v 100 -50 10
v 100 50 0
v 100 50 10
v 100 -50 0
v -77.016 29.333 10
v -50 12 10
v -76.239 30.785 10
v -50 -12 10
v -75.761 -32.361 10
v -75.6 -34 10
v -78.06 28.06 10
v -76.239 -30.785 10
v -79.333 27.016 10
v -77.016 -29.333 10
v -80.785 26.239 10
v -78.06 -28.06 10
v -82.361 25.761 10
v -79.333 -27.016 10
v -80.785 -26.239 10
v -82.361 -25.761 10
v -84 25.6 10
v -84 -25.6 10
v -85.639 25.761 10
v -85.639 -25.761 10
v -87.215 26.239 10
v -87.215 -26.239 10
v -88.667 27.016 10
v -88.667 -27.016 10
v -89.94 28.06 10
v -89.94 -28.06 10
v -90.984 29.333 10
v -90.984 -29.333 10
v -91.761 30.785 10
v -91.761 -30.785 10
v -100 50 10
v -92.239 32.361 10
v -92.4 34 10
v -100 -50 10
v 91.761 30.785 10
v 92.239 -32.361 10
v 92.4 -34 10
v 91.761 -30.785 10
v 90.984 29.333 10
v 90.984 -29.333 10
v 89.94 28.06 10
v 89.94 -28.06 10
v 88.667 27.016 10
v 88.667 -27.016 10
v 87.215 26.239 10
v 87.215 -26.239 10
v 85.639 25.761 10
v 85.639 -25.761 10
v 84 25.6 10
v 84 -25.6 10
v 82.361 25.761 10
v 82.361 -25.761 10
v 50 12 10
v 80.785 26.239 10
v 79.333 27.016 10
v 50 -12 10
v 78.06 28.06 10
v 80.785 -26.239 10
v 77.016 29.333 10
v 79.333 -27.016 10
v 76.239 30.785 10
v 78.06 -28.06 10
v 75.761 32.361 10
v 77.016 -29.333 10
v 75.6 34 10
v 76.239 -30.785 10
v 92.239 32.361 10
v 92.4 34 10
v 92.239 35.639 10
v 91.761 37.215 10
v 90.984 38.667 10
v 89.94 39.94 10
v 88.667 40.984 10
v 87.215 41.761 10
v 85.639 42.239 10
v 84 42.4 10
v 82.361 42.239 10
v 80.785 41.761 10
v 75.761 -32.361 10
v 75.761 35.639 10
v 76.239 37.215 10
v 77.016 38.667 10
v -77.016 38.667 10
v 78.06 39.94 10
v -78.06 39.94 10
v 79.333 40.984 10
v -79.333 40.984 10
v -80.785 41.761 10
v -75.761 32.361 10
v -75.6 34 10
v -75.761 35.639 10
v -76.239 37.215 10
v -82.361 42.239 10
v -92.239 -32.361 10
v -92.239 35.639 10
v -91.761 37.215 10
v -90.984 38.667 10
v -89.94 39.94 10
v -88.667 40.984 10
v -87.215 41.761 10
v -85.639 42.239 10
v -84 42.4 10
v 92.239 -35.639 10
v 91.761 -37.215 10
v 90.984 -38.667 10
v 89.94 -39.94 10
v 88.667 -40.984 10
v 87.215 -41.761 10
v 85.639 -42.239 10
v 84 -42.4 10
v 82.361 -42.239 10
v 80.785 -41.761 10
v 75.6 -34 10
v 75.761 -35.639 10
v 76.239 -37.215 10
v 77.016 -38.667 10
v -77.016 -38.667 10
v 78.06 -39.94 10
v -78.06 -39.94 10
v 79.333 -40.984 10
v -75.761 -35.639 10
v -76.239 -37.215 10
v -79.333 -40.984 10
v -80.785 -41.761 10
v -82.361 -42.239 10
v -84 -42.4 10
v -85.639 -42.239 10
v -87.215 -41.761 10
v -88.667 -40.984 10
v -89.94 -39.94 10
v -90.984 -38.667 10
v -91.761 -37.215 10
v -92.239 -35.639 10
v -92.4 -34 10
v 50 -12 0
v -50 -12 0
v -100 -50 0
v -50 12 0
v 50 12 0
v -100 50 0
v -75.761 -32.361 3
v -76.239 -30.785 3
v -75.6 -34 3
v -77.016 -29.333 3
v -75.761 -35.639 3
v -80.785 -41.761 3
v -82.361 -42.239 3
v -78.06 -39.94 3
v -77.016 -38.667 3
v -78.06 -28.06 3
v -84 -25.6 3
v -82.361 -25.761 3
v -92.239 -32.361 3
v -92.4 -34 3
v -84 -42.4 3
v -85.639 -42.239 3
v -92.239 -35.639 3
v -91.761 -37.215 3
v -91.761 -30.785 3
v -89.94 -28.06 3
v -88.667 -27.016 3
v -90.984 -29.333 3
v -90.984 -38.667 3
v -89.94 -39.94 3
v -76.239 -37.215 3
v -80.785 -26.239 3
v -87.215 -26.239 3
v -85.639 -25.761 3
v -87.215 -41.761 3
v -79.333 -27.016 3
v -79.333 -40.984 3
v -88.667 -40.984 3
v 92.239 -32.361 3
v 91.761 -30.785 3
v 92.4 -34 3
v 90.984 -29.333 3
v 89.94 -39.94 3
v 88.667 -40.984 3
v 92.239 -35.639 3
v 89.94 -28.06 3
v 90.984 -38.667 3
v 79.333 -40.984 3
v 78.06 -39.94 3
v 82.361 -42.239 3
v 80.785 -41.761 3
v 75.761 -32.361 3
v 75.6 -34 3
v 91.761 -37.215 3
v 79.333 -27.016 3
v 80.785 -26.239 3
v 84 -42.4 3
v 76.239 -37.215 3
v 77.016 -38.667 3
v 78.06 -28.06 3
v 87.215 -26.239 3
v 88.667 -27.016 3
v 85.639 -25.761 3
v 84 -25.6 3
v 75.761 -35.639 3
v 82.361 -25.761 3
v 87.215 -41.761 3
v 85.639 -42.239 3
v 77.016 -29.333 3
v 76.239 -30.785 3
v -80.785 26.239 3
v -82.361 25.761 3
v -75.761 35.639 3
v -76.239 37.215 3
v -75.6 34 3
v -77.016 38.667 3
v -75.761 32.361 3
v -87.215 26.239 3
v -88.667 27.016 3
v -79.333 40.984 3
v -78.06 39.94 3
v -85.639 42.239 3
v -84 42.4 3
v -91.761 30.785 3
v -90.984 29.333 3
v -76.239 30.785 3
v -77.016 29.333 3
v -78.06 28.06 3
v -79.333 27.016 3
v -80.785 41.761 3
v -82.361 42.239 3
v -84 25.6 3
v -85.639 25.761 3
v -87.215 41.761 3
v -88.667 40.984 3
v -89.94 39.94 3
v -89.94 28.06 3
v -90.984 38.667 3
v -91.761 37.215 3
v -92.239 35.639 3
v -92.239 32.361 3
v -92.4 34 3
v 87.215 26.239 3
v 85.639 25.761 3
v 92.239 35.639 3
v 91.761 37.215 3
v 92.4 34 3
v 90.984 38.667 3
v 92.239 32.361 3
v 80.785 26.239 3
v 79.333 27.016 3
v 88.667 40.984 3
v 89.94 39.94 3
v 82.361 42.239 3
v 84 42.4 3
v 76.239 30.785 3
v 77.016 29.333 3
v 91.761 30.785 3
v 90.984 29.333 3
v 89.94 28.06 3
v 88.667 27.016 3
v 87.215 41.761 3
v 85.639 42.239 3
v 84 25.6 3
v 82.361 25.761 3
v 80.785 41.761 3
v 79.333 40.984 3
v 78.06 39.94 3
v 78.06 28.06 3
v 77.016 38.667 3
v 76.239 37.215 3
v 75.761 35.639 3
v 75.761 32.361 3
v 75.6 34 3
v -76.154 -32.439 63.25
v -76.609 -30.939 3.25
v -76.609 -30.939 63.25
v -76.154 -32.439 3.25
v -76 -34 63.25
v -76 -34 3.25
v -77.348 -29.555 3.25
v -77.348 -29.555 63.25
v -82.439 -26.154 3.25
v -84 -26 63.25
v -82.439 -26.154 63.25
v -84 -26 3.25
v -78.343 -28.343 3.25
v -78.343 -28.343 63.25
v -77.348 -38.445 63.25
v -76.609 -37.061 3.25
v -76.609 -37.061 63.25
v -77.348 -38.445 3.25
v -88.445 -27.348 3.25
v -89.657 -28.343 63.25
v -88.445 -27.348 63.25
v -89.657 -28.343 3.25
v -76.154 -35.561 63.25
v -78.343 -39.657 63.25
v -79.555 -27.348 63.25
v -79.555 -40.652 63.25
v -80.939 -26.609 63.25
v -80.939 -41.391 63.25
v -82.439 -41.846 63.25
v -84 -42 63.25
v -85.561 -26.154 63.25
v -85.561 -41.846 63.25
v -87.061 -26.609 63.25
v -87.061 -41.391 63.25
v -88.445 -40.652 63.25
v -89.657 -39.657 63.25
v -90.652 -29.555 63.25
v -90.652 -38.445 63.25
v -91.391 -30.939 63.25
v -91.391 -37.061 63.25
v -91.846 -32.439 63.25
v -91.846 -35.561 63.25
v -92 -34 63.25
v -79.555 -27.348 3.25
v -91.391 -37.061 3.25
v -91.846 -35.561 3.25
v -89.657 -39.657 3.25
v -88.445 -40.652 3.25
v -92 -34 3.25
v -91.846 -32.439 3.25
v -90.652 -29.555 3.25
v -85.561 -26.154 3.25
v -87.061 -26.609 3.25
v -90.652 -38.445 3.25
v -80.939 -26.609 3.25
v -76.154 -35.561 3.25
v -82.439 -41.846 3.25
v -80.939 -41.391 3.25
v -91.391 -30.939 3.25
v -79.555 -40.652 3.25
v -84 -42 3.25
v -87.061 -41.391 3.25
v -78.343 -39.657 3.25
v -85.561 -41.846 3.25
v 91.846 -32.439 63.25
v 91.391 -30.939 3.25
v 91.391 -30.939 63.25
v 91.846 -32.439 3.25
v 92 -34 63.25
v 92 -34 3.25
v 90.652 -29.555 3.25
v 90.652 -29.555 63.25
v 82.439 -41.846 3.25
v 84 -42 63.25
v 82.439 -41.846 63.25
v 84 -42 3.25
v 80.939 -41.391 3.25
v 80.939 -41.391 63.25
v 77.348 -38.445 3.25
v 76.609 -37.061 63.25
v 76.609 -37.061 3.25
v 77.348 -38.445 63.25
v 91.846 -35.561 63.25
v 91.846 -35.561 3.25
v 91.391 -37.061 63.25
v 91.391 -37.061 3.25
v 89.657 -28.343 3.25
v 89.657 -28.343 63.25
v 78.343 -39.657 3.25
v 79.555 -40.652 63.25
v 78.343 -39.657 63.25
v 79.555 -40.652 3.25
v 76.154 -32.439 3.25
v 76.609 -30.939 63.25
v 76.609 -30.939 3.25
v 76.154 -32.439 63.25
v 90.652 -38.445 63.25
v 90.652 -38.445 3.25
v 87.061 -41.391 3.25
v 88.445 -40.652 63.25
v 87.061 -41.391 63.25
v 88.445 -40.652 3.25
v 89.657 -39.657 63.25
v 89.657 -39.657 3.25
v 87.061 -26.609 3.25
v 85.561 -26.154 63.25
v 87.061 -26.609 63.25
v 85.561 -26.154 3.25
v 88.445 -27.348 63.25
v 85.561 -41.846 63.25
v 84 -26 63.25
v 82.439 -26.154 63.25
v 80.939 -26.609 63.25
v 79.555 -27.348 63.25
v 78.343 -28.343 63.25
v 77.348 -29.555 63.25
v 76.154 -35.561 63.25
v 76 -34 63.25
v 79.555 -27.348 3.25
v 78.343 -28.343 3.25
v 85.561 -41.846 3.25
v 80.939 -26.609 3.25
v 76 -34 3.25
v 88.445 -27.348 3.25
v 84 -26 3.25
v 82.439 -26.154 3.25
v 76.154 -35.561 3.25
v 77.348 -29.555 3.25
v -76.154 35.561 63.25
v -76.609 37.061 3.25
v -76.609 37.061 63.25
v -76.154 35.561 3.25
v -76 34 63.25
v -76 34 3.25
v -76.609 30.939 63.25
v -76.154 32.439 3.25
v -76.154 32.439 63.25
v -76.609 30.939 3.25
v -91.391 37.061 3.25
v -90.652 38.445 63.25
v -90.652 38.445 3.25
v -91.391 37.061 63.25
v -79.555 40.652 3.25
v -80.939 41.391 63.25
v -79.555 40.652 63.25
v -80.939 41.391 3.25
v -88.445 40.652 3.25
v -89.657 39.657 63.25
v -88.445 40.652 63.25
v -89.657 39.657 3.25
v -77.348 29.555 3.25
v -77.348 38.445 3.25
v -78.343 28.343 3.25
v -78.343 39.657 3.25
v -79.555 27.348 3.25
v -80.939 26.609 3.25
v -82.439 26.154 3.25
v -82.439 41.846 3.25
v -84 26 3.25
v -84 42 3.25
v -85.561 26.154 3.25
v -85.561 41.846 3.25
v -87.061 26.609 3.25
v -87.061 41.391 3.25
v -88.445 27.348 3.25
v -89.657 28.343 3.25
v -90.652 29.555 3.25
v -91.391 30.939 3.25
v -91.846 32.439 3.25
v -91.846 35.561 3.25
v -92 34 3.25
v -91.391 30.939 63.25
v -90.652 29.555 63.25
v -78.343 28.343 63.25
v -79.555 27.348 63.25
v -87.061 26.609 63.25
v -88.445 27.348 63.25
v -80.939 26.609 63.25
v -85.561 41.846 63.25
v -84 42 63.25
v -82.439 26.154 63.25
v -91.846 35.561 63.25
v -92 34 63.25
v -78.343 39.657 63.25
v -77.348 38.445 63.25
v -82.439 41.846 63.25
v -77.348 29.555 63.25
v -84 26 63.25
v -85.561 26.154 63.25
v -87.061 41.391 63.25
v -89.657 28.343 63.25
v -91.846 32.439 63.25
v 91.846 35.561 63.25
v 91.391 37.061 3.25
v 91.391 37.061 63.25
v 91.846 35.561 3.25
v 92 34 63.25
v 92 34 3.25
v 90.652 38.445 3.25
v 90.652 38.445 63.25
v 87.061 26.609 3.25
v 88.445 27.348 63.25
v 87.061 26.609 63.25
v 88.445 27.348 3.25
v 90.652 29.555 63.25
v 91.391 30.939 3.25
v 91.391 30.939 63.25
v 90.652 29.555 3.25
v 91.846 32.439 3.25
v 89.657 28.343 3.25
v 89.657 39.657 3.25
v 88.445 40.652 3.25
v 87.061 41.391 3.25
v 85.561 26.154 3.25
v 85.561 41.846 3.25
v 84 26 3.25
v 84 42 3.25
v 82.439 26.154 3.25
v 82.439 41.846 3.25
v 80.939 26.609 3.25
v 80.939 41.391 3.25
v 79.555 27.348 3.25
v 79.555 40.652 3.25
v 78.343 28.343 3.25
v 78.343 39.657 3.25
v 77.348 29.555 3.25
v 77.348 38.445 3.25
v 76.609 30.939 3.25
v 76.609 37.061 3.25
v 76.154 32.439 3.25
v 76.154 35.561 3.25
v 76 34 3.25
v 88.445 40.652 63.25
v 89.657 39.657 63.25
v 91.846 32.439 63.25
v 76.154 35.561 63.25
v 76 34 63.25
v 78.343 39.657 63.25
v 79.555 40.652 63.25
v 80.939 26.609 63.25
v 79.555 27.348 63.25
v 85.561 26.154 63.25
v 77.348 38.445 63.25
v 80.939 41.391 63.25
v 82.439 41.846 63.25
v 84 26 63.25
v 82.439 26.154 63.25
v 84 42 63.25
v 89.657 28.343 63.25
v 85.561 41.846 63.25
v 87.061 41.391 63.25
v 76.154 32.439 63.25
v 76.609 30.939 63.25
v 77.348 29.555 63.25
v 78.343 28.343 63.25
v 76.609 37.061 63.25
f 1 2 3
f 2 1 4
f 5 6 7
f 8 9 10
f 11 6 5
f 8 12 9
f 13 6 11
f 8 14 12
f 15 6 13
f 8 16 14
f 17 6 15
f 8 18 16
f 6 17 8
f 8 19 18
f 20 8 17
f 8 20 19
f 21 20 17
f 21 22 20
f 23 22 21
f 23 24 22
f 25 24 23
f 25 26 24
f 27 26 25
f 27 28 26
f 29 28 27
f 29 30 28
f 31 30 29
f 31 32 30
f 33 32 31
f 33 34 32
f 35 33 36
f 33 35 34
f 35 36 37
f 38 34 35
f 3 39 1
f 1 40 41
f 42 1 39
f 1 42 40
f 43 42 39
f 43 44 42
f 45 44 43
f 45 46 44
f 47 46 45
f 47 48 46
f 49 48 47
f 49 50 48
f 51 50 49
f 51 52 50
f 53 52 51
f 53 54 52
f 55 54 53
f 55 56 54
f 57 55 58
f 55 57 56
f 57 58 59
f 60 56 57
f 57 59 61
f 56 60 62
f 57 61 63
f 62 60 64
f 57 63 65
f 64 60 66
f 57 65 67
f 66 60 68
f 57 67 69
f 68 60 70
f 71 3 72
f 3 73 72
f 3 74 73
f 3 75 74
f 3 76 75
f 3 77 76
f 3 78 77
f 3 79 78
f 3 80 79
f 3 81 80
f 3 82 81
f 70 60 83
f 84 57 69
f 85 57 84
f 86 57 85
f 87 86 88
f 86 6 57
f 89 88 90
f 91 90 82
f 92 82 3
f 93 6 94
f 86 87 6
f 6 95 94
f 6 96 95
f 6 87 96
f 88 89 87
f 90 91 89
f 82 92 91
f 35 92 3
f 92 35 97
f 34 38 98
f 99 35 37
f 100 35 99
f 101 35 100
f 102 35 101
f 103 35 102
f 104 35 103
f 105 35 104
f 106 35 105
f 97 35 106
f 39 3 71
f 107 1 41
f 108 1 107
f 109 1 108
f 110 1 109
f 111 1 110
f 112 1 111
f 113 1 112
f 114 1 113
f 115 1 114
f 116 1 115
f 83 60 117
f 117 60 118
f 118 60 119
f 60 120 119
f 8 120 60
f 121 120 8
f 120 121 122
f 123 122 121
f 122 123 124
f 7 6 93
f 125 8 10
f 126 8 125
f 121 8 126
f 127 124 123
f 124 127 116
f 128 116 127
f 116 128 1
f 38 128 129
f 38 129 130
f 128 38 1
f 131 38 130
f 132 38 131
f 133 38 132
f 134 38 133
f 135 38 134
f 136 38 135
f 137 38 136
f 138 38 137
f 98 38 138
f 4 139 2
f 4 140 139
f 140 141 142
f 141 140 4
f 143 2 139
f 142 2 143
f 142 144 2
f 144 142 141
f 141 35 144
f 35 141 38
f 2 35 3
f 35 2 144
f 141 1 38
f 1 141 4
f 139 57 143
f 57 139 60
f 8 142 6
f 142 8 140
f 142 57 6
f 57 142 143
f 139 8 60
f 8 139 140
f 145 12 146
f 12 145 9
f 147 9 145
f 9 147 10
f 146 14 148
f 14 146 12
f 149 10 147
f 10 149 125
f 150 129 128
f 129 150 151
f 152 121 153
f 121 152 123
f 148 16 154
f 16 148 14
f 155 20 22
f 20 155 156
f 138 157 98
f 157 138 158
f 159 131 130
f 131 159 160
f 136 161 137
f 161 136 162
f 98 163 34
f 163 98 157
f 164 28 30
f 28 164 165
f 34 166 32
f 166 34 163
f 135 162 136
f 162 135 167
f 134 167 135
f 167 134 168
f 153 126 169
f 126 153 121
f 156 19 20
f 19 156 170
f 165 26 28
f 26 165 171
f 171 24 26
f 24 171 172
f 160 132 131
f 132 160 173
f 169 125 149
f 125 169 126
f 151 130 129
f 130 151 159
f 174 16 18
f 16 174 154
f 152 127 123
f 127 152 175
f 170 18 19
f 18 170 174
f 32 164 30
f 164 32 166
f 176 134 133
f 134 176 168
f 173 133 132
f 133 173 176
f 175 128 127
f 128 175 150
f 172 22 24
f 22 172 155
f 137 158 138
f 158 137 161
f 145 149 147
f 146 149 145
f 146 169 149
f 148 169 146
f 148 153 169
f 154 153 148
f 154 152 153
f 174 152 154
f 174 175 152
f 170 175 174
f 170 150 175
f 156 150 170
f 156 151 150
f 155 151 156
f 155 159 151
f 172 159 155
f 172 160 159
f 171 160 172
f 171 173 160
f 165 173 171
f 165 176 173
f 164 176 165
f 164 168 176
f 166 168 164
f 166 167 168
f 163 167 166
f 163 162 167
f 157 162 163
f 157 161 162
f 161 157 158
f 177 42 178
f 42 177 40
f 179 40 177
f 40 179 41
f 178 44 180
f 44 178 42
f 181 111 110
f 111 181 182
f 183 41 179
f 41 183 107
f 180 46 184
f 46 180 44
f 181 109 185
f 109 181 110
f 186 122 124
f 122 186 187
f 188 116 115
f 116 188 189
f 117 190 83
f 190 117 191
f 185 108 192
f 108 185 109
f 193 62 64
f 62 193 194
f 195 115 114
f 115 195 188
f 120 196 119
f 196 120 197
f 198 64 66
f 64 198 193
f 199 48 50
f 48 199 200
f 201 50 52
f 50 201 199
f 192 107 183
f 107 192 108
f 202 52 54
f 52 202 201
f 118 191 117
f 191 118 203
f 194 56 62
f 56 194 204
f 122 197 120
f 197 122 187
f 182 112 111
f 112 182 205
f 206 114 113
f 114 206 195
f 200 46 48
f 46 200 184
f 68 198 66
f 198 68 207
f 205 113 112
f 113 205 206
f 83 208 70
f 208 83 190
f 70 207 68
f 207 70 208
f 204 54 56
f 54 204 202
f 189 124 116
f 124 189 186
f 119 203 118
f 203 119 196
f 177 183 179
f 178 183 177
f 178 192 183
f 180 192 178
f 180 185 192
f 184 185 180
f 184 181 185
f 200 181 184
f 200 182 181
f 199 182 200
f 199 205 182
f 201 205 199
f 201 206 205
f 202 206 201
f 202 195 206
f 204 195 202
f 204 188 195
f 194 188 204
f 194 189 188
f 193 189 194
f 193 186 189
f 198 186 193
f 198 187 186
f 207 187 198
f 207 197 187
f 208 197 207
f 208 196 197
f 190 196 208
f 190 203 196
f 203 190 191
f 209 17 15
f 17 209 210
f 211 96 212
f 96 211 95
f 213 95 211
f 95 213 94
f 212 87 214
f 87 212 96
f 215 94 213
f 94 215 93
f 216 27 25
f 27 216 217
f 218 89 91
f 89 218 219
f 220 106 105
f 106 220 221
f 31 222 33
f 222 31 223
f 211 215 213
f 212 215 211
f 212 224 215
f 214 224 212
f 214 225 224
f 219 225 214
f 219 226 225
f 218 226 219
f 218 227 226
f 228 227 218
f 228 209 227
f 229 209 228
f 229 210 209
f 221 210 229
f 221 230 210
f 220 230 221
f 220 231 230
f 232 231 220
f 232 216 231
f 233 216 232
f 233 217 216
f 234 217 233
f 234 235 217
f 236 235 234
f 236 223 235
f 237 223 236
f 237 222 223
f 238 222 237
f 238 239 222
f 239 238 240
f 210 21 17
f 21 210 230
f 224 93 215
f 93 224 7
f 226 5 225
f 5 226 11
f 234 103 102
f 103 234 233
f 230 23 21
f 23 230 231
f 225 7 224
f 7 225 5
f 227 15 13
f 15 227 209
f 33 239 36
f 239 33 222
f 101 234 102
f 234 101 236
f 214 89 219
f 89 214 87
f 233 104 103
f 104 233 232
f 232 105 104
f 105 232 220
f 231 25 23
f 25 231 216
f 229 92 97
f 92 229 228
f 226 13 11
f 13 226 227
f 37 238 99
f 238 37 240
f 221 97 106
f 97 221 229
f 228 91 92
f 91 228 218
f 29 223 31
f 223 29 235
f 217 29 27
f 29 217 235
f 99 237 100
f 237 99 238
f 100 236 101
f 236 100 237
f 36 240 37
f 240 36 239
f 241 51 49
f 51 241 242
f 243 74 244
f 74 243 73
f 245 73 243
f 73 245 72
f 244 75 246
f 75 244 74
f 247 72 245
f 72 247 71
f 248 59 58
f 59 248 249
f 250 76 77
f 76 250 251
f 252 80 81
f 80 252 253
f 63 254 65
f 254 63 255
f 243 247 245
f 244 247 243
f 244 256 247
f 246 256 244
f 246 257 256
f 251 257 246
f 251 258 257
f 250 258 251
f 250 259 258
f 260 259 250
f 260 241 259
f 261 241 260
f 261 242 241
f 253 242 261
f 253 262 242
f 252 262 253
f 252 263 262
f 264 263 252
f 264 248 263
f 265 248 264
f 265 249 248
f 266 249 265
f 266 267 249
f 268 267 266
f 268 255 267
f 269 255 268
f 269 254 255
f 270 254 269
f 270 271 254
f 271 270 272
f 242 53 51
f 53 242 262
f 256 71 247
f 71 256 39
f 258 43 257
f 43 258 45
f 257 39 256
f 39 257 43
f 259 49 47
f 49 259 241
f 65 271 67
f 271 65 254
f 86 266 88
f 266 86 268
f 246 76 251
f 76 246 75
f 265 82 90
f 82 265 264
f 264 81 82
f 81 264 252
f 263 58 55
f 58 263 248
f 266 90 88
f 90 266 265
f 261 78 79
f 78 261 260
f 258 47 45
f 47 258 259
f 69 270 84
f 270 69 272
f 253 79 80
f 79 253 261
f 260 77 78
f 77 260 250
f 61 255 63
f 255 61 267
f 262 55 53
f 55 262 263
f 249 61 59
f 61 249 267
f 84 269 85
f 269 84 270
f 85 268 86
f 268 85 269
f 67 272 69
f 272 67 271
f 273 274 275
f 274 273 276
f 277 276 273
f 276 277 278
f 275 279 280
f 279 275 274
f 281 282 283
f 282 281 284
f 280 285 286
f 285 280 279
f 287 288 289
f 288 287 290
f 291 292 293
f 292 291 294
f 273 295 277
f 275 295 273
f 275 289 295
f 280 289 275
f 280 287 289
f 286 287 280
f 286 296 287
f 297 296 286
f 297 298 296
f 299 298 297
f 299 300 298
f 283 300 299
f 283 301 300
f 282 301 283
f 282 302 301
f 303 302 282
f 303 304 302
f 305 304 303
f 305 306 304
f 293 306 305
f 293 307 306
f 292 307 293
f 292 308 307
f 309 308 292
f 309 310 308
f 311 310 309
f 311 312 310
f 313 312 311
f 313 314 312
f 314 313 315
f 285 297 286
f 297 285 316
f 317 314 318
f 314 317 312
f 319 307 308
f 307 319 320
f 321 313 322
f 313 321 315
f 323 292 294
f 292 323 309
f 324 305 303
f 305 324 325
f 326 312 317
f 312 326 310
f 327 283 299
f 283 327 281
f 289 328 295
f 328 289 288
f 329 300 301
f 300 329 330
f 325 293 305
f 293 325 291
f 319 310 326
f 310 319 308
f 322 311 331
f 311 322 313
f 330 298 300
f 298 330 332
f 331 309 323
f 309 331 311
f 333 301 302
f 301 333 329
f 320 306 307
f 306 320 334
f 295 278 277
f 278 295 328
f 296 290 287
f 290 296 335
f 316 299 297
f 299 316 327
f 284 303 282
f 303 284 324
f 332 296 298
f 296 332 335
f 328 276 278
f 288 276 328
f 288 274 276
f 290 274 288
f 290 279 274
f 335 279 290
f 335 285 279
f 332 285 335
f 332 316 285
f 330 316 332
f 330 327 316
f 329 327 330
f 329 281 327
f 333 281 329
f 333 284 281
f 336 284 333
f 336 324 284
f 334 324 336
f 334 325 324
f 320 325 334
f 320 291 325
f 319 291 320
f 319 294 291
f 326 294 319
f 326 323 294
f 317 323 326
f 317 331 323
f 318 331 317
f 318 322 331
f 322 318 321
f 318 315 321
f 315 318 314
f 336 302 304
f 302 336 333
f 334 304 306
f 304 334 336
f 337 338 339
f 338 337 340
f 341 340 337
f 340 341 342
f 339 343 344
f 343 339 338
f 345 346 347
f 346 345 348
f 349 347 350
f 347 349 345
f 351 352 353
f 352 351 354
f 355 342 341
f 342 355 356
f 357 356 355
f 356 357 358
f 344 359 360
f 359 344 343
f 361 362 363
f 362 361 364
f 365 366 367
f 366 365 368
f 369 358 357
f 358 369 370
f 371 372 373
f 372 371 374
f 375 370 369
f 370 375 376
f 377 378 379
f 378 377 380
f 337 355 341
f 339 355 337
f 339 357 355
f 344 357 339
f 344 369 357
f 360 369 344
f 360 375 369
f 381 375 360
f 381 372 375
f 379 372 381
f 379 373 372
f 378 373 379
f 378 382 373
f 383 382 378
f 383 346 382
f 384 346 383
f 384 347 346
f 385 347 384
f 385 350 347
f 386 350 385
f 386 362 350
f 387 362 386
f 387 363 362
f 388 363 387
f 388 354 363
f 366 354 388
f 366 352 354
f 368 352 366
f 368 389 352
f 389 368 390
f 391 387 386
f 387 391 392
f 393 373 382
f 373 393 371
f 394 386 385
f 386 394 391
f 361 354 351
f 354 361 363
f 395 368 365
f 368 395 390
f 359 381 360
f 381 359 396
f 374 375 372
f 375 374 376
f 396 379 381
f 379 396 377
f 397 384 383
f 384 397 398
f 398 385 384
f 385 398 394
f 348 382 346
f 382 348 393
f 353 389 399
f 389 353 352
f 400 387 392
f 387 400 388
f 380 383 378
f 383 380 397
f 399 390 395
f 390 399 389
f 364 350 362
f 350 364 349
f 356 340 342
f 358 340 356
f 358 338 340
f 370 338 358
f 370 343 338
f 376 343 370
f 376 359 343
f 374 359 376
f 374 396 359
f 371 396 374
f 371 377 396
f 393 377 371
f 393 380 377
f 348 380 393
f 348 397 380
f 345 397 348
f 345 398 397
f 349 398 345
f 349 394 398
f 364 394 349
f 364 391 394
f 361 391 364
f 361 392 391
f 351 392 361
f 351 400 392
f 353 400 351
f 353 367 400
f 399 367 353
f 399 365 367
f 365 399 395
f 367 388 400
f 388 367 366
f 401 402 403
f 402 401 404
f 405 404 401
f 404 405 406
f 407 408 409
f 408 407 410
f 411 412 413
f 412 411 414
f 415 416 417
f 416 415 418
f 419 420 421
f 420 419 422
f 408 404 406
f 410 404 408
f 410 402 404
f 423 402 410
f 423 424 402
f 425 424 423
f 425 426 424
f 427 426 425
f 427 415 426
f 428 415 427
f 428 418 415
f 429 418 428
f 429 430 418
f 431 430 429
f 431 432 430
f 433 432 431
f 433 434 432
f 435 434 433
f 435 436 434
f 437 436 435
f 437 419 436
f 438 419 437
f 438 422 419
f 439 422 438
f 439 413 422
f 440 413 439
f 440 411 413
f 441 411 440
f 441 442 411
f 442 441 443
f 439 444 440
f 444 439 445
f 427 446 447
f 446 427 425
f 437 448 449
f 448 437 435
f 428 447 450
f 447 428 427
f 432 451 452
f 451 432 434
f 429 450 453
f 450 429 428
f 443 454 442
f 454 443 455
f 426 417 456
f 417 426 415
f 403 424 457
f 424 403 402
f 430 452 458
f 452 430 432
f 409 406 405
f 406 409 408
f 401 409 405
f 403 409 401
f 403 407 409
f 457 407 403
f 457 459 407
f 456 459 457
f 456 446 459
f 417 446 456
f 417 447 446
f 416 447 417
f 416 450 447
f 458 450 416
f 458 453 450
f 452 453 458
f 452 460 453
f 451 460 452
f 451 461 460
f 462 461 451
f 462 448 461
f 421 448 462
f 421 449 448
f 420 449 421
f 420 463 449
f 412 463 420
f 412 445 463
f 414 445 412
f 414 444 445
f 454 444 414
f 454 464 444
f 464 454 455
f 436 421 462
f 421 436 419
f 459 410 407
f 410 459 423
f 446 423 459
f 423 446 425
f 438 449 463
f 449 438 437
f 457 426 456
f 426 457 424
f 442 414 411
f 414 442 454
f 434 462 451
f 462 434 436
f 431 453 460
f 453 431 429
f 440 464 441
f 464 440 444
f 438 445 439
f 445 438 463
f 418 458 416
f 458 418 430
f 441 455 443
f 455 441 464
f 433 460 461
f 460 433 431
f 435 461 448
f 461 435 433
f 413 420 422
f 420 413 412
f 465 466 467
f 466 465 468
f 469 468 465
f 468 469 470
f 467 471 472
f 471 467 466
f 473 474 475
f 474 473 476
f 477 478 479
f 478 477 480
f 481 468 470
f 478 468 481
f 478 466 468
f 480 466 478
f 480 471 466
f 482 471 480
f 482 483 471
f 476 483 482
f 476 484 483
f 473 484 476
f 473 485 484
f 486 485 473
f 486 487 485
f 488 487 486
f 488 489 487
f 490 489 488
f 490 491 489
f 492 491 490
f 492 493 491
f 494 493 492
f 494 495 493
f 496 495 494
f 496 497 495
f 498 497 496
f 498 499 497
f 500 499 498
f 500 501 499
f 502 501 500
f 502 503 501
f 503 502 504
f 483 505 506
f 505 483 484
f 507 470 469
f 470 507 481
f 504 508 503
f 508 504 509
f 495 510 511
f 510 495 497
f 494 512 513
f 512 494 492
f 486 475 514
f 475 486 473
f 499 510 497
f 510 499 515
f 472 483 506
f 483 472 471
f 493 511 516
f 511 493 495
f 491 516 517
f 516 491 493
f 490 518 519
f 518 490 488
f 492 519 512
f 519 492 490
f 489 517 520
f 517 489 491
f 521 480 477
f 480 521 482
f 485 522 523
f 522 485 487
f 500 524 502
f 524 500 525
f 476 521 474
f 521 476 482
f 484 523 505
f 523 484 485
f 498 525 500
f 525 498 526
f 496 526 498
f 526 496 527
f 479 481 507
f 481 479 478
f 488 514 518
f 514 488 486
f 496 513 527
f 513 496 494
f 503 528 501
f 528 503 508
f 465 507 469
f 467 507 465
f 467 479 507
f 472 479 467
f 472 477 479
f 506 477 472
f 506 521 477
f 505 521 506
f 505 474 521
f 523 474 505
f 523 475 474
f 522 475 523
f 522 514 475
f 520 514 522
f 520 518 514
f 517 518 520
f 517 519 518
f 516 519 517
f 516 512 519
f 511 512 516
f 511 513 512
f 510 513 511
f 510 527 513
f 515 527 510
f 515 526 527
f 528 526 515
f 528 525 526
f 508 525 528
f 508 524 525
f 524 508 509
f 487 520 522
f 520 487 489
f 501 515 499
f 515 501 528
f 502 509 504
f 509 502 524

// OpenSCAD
$fn = 32;

// ------------------------------------------------------------------------
// Frame with four posts: 200 x 100 mm frame, four d16 posts
// Every part is its own module, assembly() places them once.
// ------------------------------------------------------------------------

// --- part 1 ---
module base_frame() {
  difference() {
    translate([-100, -50, 0]) cube([200, 100, 10]);
    translate([-50, -12, -1]) cube([100, 24, 12]);
    translate([-84, -34, 3]) cylinder(h = 8, d = 16.8);
    translate([84, -34, 3]) cylinder(h = 8, d = 16.8);
    translate([-84, 34, 3]) cylinder(h = 8, d = 16.8);
    translate([84, 34, 3]) cylinder(h = 8, d = 16.8);
  }
}

// --- part 2 ---
module post1() {
  cylinder(h = 60, d = 16);
}

// --- part 3 ---
module post2() {
  cylinder(h = 60, d = 16);
}

// --- part 4 ---
module post3() {
  cylinder(h = 60, d = 16);
}

// --- part 5 ---
module post4() {
  cylinder(h = 60, d = 16);
}

// --- assembly ---
module assembly() {
  translate([0, 0, 0]) rotate([0, 0, 0]) base_frame();
  translate([-84, -34, 3.25]) rotate([0, 0, 0]) post1();
  translate([84, -34, 3.25]) rotate([0, 0, 0]) post2();
  translate([-84, 34, 3.25]) rotate([0, 0, 0]) post3();
  translate([84, 34, 3.25]) rotate([0, 0, 0]) post4();
}

assembly();
